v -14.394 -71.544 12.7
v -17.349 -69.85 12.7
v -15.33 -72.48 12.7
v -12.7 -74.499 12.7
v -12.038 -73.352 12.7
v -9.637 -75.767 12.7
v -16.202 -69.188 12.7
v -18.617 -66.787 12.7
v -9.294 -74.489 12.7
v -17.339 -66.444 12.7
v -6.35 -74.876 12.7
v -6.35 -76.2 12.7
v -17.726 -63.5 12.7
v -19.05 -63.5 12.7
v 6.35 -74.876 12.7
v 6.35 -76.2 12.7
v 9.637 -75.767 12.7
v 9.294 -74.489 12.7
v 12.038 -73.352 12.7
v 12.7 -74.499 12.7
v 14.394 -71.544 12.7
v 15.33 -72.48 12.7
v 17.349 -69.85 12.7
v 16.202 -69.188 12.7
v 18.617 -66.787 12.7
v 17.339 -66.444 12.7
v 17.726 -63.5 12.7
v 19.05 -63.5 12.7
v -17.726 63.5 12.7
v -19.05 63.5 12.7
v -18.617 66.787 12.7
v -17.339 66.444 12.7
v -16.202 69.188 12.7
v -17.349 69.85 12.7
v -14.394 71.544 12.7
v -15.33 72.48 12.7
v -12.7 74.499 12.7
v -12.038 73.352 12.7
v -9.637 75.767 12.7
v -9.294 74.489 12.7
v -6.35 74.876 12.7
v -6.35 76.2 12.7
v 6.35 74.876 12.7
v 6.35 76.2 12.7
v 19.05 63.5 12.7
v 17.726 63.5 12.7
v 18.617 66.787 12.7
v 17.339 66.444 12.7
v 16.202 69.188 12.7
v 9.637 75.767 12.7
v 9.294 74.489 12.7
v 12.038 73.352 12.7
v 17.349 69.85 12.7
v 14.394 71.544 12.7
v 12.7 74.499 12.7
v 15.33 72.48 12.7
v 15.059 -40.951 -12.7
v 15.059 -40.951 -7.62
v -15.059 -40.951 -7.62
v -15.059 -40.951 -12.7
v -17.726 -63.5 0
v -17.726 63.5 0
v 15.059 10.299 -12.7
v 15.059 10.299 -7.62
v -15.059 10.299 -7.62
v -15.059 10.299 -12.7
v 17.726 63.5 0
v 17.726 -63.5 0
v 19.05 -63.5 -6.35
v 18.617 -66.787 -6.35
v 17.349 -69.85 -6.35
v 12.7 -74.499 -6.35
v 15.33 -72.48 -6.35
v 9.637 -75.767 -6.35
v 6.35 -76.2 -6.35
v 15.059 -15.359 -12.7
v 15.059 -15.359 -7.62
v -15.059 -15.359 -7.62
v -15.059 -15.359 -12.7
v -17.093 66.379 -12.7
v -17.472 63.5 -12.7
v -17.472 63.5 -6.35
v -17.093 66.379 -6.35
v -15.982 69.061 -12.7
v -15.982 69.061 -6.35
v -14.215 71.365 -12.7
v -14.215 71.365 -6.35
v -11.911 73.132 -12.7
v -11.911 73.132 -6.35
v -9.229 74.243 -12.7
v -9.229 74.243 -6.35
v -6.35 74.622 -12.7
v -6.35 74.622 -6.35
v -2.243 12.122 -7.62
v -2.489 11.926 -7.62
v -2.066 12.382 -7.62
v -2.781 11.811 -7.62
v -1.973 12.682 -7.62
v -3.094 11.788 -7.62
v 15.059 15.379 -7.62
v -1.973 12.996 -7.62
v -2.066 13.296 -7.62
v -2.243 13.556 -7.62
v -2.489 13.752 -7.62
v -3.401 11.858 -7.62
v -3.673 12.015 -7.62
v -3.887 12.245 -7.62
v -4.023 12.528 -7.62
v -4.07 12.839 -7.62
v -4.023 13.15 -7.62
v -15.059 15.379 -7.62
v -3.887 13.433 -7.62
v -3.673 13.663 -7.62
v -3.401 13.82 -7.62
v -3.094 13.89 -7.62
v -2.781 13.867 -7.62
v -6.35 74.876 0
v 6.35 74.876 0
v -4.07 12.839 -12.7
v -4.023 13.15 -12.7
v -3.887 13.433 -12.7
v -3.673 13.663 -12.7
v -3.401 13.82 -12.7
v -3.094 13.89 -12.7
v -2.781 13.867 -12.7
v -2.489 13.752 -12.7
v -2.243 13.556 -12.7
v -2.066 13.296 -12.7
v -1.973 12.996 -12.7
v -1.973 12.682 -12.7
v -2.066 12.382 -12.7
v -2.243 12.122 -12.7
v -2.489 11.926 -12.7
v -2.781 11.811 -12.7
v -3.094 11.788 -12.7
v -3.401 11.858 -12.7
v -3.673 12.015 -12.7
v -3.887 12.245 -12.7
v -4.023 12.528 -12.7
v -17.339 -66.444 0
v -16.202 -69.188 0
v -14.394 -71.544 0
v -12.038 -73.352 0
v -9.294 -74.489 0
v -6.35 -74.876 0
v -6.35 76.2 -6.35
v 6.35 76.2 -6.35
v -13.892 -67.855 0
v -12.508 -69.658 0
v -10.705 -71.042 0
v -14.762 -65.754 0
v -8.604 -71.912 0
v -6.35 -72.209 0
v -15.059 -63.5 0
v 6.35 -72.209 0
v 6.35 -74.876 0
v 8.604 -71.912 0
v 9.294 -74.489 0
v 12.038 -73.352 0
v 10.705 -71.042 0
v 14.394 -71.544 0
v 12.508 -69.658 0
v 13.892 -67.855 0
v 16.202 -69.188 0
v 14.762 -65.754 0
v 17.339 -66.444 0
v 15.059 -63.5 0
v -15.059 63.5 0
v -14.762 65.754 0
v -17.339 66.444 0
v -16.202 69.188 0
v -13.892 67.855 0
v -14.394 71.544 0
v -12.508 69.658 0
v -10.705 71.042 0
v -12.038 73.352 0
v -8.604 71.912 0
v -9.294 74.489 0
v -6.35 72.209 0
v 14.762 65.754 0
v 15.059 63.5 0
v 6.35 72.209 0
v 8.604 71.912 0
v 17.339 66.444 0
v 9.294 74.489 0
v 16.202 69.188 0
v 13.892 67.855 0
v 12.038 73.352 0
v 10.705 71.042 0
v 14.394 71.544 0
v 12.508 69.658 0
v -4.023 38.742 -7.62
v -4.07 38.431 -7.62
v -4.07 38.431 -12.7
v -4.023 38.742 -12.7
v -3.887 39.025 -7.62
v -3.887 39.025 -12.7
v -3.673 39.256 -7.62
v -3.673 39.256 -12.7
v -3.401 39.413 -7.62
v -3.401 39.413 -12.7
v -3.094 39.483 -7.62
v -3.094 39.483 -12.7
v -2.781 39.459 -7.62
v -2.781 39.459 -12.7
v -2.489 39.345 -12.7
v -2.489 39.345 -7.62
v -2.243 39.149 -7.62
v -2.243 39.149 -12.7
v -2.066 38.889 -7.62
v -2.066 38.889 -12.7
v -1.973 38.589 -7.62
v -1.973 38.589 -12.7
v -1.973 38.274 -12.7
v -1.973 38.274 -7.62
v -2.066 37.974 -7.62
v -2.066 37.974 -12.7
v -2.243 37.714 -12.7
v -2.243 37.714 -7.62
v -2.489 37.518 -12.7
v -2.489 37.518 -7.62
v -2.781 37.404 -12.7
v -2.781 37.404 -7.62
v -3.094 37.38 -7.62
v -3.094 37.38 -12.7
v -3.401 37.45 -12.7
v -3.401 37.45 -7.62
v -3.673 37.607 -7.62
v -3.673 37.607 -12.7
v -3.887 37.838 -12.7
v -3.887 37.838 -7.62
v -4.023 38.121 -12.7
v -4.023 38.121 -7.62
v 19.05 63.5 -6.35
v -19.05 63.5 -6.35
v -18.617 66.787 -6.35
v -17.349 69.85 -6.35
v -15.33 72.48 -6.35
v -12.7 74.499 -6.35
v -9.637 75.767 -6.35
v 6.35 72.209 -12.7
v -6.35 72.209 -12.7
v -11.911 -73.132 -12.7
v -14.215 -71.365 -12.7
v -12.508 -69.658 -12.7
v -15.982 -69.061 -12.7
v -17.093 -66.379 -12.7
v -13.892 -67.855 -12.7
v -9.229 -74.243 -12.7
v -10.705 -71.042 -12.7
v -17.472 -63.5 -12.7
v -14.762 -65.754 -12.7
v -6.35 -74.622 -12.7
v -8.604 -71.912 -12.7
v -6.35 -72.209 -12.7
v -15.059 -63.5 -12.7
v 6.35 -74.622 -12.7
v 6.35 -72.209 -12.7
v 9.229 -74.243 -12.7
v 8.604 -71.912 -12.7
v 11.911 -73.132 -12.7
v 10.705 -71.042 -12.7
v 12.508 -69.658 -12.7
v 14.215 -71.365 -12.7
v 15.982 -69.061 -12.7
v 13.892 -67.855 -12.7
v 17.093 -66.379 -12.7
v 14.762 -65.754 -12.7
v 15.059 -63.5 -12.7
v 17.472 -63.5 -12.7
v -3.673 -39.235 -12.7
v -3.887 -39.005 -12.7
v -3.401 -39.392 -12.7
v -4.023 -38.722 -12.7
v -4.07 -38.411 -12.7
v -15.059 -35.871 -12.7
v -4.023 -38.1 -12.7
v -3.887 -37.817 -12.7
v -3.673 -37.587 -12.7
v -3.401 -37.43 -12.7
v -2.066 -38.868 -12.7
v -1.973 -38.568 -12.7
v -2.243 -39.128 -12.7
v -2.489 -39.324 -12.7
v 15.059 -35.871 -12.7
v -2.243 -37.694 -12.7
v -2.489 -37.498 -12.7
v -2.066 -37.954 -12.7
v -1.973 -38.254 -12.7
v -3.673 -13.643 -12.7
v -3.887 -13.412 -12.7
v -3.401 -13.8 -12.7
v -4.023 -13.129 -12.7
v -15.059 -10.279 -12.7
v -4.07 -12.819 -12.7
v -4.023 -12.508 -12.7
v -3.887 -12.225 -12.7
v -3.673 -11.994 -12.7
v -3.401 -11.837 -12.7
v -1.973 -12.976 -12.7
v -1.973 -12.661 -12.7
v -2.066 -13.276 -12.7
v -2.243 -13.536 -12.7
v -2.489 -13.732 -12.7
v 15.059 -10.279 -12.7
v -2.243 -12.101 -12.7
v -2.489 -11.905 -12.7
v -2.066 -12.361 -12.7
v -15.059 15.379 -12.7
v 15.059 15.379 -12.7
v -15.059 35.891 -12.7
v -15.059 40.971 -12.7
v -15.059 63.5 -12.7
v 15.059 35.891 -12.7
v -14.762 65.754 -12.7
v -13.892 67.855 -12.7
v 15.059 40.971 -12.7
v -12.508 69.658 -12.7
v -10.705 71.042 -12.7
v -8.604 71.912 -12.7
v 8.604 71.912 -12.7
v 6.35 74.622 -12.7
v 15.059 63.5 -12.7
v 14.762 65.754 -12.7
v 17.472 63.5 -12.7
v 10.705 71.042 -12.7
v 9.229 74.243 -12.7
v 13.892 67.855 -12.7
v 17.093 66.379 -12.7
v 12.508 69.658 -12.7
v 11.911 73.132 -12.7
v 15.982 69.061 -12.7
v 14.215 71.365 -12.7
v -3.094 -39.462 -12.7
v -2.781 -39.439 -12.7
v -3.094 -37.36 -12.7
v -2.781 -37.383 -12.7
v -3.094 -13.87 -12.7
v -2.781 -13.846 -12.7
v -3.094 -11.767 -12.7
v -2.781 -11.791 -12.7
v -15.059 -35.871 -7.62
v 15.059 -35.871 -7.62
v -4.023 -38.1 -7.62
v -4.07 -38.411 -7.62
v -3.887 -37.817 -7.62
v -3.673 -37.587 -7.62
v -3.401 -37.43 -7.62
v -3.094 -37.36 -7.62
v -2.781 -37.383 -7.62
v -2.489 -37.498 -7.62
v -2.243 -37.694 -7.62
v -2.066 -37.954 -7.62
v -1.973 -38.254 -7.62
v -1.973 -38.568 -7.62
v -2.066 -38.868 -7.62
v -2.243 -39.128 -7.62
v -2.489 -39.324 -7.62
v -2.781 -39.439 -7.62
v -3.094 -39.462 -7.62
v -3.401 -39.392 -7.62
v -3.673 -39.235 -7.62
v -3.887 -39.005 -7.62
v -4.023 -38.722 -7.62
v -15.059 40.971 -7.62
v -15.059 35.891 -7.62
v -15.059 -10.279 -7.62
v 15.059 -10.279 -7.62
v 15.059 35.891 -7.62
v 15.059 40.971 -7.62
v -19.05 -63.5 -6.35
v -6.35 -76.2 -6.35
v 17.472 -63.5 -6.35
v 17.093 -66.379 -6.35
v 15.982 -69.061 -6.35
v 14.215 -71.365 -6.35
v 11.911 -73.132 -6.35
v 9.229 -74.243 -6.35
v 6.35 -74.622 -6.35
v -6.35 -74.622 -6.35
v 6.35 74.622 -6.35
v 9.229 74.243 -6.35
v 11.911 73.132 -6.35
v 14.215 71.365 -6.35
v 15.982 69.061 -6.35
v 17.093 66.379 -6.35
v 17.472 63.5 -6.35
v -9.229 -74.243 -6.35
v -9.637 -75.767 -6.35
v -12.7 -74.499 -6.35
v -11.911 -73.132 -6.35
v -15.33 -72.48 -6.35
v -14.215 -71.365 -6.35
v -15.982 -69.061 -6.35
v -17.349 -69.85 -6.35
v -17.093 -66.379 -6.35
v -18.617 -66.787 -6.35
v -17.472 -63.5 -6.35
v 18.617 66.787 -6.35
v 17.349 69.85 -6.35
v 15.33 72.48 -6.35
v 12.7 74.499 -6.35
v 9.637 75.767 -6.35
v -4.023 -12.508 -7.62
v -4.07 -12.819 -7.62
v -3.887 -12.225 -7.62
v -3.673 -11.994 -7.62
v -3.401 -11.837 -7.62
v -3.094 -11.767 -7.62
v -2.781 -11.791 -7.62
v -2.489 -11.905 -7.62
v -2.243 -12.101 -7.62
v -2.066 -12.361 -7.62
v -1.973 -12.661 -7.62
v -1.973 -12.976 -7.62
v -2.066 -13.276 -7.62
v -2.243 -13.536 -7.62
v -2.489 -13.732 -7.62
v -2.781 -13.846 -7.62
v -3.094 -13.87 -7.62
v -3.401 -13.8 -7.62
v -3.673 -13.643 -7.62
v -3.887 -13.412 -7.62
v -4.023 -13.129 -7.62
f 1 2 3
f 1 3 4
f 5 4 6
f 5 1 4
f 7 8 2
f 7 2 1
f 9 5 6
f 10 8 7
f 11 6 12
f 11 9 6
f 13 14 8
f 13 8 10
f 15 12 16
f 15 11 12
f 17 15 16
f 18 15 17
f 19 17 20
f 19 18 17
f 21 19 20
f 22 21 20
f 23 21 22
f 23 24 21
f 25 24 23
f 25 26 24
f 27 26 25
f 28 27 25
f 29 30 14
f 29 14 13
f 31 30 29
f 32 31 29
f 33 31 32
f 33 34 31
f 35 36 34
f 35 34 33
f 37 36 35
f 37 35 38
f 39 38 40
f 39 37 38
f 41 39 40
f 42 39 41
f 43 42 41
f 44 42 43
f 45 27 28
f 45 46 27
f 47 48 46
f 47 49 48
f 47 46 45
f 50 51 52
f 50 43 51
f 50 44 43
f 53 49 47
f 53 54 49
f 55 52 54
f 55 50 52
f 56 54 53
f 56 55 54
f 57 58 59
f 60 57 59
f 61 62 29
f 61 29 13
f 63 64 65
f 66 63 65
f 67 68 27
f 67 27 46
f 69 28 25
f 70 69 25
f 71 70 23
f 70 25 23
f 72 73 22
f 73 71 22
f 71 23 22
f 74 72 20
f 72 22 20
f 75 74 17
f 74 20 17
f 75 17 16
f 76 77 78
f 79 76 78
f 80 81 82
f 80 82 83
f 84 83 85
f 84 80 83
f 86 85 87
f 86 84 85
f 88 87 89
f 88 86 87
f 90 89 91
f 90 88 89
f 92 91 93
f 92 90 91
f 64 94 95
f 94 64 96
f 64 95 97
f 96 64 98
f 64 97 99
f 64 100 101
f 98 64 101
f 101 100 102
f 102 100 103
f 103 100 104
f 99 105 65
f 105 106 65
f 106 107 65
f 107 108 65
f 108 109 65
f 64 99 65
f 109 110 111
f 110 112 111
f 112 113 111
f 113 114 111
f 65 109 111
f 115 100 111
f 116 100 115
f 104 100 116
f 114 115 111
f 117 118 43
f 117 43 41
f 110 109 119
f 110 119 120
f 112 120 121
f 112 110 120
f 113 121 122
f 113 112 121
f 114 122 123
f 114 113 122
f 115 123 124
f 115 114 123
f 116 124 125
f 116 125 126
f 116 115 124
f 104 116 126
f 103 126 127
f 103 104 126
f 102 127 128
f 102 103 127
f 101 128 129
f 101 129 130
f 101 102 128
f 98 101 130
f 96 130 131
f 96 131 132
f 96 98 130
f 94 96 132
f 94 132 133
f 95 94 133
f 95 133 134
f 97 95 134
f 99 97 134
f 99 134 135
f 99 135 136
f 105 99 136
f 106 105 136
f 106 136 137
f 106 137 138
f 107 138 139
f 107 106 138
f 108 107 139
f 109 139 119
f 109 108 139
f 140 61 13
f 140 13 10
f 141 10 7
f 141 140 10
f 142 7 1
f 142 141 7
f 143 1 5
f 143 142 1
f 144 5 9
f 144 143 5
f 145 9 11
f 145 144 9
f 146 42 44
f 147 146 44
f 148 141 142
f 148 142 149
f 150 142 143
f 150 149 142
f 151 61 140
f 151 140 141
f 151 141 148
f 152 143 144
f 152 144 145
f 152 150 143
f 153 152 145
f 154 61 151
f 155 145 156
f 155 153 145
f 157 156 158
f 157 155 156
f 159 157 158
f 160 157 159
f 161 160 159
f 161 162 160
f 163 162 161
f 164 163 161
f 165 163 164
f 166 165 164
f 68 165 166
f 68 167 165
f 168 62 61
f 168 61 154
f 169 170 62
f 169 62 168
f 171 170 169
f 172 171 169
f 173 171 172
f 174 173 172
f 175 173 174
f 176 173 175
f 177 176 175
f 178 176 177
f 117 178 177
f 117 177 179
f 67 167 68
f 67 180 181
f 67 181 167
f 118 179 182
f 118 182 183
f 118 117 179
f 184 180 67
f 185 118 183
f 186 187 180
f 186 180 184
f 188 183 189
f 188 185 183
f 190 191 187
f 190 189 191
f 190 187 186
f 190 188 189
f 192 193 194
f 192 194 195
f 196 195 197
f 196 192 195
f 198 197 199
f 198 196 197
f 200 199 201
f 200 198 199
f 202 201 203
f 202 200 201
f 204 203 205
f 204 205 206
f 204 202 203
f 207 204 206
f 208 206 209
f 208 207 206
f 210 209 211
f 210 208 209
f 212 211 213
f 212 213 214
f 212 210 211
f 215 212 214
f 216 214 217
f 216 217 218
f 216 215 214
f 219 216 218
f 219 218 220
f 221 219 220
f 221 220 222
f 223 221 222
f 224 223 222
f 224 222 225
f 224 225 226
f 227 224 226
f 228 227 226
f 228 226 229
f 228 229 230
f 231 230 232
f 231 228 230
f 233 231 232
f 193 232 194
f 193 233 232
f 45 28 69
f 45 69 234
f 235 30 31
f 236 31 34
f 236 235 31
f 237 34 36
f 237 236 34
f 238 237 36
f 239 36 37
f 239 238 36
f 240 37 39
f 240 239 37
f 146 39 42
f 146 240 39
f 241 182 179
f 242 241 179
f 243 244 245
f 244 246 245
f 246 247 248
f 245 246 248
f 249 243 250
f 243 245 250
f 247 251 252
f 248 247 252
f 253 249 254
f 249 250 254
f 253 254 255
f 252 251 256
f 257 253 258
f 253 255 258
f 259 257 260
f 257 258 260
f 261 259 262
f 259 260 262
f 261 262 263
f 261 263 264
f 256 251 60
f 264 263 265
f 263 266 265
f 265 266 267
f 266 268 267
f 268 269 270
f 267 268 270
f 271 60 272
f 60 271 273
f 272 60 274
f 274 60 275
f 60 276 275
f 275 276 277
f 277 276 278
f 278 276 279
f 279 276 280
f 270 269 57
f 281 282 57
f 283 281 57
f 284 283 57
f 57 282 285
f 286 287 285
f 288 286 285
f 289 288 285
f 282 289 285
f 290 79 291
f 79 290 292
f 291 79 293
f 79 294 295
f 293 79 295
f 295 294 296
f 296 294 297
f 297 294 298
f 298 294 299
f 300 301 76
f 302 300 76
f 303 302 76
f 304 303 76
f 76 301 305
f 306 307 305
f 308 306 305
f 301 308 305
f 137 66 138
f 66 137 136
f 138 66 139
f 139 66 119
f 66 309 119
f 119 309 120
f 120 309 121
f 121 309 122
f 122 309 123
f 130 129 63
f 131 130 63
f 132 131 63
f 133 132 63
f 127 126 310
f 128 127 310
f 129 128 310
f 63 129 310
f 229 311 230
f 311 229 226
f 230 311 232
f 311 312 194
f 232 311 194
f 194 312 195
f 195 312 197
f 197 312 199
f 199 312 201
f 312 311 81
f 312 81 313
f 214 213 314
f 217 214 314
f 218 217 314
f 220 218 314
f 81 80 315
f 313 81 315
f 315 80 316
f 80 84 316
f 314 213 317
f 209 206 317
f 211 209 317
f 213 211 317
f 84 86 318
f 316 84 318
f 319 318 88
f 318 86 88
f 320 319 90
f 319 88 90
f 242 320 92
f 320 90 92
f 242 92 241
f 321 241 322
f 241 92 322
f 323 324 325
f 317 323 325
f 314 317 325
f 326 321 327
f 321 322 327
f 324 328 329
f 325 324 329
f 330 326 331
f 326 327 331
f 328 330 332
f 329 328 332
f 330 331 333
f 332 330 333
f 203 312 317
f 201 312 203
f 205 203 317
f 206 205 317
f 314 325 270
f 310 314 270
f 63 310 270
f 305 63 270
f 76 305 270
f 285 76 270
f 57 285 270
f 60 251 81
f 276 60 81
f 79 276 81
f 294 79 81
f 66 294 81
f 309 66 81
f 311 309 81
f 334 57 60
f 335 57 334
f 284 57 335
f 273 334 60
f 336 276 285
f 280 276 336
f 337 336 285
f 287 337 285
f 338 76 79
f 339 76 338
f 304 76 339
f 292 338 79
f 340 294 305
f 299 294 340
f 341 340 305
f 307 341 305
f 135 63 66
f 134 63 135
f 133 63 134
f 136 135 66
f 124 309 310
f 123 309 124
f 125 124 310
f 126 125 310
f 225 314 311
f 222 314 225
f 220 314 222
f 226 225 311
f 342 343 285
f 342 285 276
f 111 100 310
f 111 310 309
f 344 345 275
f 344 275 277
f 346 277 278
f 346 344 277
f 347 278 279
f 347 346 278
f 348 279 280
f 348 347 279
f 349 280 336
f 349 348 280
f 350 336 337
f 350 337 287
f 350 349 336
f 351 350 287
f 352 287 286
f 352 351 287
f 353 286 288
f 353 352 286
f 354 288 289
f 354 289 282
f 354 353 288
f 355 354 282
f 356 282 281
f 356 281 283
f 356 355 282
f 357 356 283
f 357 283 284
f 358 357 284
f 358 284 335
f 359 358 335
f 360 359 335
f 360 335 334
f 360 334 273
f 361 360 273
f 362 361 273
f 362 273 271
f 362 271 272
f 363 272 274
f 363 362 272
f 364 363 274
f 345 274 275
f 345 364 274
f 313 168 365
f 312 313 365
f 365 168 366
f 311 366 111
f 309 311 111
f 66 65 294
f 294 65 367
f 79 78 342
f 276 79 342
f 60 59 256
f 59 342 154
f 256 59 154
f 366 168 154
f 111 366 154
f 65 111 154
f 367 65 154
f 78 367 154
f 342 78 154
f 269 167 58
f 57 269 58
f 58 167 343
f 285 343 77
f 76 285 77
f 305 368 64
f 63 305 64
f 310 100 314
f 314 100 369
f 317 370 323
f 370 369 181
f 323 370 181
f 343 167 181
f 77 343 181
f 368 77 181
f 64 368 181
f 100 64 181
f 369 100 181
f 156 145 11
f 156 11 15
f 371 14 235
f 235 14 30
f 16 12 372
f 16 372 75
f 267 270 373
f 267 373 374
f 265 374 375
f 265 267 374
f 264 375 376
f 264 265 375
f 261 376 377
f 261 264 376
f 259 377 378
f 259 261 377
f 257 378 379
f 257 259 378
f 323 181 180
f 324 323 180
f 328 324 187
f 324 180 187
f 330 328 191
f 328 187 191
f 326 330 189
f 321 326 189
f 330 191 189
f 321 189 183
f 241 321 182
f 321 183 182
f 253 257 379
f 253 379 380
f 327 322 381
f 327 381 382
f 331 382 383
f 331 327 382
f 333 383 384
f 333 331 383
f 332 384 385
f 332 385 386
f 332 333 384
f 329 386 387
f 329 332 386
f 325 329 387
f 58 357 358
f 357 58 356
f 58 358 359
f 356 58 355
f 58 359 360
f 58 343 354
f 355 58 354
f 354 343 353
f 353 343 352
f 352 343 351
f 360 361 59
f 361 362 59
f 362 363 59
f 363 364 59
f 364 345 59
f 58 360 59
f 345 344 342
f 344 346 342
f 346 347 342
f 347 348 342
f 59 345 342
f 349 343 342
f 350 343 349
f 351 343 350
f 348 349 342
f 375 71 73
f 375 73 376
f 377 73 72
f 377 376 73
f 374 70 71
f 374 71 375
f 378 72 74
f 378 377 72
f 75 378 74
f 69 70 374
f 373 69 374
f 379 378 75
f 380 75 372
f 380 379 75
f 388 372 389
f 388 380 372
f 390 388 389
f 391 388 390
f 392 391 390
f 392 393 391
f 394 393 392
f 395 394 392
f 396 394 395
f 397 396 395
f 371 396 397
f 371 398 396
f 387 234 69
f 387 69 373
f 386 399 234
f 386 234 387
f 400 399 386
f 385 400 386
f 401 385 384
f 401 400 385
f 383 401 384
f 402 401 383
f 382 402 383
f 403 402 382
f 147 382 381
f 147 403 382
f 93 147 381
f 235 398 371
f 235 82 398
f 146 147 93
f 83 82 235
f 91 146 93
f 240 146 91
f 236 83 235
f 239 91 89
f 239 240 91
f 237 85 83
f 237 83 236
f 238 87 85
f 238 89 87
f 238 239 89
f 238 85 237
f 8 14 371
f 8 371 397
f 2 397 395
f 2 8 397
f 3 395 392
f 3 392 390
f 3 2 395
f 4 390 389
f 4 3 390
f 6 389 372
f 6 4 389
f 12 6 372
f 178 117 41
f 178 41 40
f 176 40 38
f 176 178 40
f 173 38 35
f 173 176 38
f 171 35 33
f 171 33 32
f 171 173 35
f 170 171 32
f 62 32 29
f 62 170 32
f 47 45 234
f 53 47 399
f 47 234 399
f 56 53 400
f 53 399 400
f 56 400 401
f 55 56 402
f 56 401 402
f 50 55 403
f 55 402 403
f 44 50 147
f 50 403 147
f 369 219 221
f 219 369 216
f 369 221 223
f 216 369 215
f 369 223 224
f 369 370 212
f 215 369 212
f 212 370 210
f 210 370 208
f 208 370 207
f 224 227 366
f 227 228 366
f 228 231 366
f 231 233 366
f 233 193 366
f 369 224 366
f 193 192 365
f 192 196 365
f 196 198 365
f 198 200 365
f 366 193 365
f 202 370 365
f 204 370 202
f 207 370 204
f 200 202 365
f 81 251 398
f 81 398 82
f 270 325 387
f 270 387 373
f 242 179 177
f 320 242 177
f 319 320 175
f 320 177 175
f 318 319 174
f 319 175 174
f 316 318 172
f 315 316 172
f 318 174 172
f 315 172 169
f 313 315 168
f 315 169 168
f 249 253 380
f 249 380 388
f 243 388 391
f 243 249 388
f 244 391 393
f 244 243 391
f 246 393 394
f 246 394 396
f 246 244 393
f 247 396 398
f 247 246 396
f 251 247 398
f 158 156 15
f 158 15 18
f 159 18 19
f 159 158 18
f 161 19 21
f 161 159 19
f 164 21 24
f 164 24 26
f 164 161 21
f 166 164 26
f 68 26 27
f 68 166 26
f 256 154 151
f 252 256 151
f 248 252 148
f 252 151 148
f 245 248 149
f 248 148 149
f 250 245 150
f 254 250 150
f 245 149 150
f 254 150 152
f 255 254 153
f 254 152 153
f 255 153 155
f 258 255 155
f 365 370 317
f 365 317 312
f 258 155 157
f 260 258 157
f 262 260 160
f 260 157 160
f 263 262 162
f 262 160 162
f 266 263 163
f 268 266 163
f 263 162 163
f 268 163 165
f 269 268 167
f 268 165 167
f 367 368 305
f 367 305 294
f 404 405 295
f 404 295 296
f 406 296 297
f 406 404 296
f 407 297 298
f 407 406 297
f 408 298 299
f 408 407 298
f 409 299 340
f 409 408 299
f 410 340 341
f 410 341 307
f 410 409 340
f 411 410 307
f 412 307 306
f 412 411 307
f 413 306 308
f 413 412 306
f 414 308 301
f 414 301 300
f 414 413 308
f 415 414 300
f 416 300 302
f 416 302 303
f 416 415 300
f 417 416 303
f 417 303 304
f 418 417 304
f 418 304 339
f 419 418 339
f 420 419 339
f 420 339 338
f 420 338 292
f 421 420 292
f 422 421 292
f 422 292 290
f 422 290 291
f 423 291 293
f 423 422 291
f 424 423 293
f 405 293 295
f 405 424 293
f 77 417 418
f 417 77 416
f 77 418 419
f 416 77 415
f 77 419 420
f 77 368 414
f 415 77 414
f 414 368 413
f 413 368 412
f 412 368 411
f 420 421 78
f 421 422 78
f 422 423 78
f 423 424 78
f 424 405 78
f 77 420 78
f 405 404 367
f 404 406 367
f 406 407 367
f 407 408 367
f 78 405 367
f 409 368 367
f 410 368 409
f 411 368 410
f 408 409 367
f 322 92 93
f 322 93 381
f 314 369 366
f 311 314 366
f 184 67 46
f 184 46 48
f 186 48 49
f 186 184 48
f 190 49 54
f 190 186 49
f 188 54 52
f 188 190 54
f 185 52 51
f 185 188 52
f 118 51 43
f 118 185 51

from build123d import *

# Parameters (mm, degrees)
SKETCH1_W               = 38.1
SKETCH1_H               = 152.4
BOSS_EXTRUDE1_DEPTH     = 12.7
FILLET1_R               = 12.7
CUT_EXTRUDE1_DEPTH      = 83.55
EXTRUDE_THIN1_START     = -12.7
EXTRUDE_THIN1_DEPTH     = 12.7
CUT_EXTRUDE2_DEPTH      = 6.35
SKETCH6_W               = 35.1984056
SKETCH6_H               = 5.08
SKETCH6_R               = 1.054294776
BOSS_EXTRUDE2_DEPTH     = 5.08
CLEARANCE_1_DEPTH       = 6.35
CUT_EXTRUDE_THIN2_START = -12.7
CUT_EXTRUDE_THIN2_DEPTH = 12.7


with BuildPart() as part:
    # Sketch1 → Boss-Extrude1 (new, symmetric)
    with BuildSketch(Plane.XY):
        Rectangle(SKETCH1_W, SKETCH1_H)
    extrude(amount=BOSS_EXTRUDE1_DEPTH, both=True)

    # Fillet1
    fillet1_edges = [part.edges().sort_by_distance(p)[0] for p in [
        (19.05, -76.2, 0),
        (-19.05, -76.2, 0),
        (-19.05, 76.2, 0),
        (19.05, 76.2, 0),
    ]]
    fillet(fillet1_edges, radius=FILLET1_R)

    # Sketch2 → Cut-Extrude1 (cut, through all)
    with BuildSketch(Plane.XY.offset(12.7)):
        with BuildLine():
            Line((-17.599200768, 63.5), (-17.599200768, -63.5))
            ThreePointArc((-17.599200768, -63.5), (-14.304386146, -71.454386146), (-6.35, -74.749200768))
            Line((-6.35, -74.749200768), (6.35, -74.749200768))
            ThreePointArc((6.35, -74.749200768), (14.304386146, -71.454386146), (17.599200768, -63.5))
            Line((17.599200768, -63.5), (17.599200768, 63.5))
            ThreePointArc((17.599200768, 63.5), (14.304386146, 71.454386146), (6.35, 74.749200768))
            Line((6.35, 74.749200768), (-6.35, 74.749200768))
            ThreePointArc((-6.35, 74.749200768), (-14.304386146, 71.454386146), (-17.599200768, 63.5))
        make_face()
    extrude(amount=-CUT_EXTRUDE1_DEPTH, mode=Mode.SUBTRACT)

    # Sketch3 → Extrude-Thin1 (add)
    with BuildSketch(Plane(origin=(0, 0, -12.7), x_dir=(-1, 0, 0), z_dir=(0, 0, -1)).offset(EXTRUDE_THIN1_START)):
        with BuildLine():
            Line((-6.35, 74.749200768), (6.35, 74.749200768))
            ThreePointArc((6.35, 74.749200768), (14.304386146, 71.454386146), (17.599200768, 63.5))
            Line((17.599200768, 63.5), (17.599200768, -63.5))
            ThreePointArc((17.599200768, -63.5), (14.304386146, -71.454386146), (6.35, -74.749200768))
            Line((6.35, -74.749200768), (-6.35, -74.749200768))
            ThreePointArc((-6.35, -74.749200768), (-14.304386146, -71.454386146), (-17.599200768, -63.5))
            Line((-17.599200768, -63.5), (-17.599200768, 63.5))
            ThreePointArc((-17.599200768, 63.5), (-14.304386146, 71.454386146), (-6.35, 74.749200768))
        make_face()
        with BuildLine():
            Line((-6.35, 72.209200768), (6.35, 72.209200768))
            ThreePointArc((6.35, 72.209200768), (12.508334922, 69.658334922), (15.059200768, 63.5))
            Line((15.059200768, 63.5), (15.059200768, -63.5))
            ThreePointArc((15.059200768, -63.5), (12.508334922, -69.658334922), (6.35, -72.209200768))
            Line((6.35, -72.209200768), (-6.35, -72.209200768))
            ThreePointArc((-6.35, -72.209200768), (-12.508334922, -69.658334922), (-15.059200768, -63.5))
            Line((-15.059200768, -63.5), (-15.059200768, 63.5))
            ThreePointArc((-15.059200768, 63.5), (-12.508334922, 69.658334922), (-6.35, 72.209200768))
        make_face(mode=Mode.SUBTRACT)
    extrude(amount=EXTRUDE_THIN1_DEPTH)

    # Sketch4 → Cut-Extrude2 (cut)
    with BuildSketch(Plane(origin=(0, 0, -12.7), x_dir=(-1, 0, 0), z_dir=(0, 0, -1))):
        with BuildLine():
            Line((6.35, -76.2), (-6.35, -76.2))
            ThreePointArc((-6.35, -76.2), (-15.330256121, -72.480256121), (-19.05, -63.5))
            Line((-19.05, -63.5), (-19.05, 63.5))
            ThreePointArc((-19.05, 63.5), (-15.330256121, 72.480256121), (-6.35, 76.2))
            Line((-6.35, 76.2), (6.35, 76.2))
            ThreePointArc((6.35, 76.2), (15.330256121, 72.480256121), (19.05, 63.5))
            Line((19.05, 63.5), (19.05, -63.5))
            ThreePointArc((19.05, -63.5), (15.330256121, -72.480256121), (6.35, -76.2))
        make_face()
        with BuildLine():
            Line((-17.5992028, -63.5), (-17.5992028, 63.5))
            ThreePointArc((-17.5992028, 63.5), (-14.304387583, 71.454387583), (-6.35, 74.7492028))
            Line((-6.35, 74.7492028), (6.35, 74.7492028))
            ThreePointArc((6.35, 74.7492028), (14.304387583, 71.454387583), (17.5992028, 63.5))
            Line((17.5992028, 63.5), (17.5992028, -63.5))
            ThreePointArc((17.5992028, -63.5), (14.304387583, -71.454387583), (6.35, -74.7492028))
            Line((6.35, -74.7492028), (-6.35, -74.7492028))
            ThreePointArc((-6.35, -74.7492028), (-14.304387583, -71.454387583), (-17.5992028, -63.5))
        make_face(mode=Mode.SUBTRACT)
    extrude(amount=-CUT_EXTRUDE2_DEPTH, mode=Mode.SUBTRACT)

    # Sketch6 → Boss-Extrude2 (add)
    # profile 1 of 4: a face of its own
    with BuildSketch(Plane(origin=(0, 0, -7.62), x_dir=(-1, 0, 0), z_dir=(0, 0, -1))):
        with Locations((0, 38.431496192)):
            Rectangle(SKETCH6_W, SKETCH6_H)
        with Locations((3.015690418, 38.431496192)):
            Circle(SKETCH6_R, mode=Mode.SUBTRACT)
    # profile 2 of 4: a face of its own
    with BuildSketch(Plane(origin=(0, 0, -7.62), x_dir=(-1, 0, 0), z_dir=(0, 0, -1))):
        with Locations((0, 12.839006486)):
            Rectangle(SKETCH6_W, SKETCH6_H)
        with Locations((3.015690418, 12.839006486)):
            Circle(SKETCH6_R, mode=Mode.SUBTRACT)
    # profile 3 of 4: a face of its own
    with BuildSketch(Plane(origin=(0, 0, -7.62), x_dir=(-1, 0, 0), z_dir=(0, 0, -1))):
        with Locations((0, -12.818503808)):
            Rectangle(SKETCH6_W, SKETCH6_H)
        with Locations((3.015690418, -12.818503808)):
            Circle(SKETCH6_R, mode=Mode.SUBTRACT)
    # profile 4 of 4: a face of its own
    with BuildSketch(Plane(origin=(0, 0, -7.62), x_dir=(-1, 0, 0), z_dir=(0, 0, -1))):
        with Locations((0, -38.410993514)):
            Rectangle(SKETCH6_W, SKETCH6_H)
        with Locations((3.015690418, -38.410993514)):
            Circle(SKETCH6_R, mode=Mode.SUBTRACT)
    extrude(amount=BOSS_EXTRUDE2_DEPTH)

    # Sketch7 → Clearance 1 (cut)
    with BuildSketch(Plane(origin=(0, 0, -12.7), x_dir=(-1, 0, 0), z_dir=(0, 0, -1))):
        with BuildLine():
            Line((-17.5992028, 63.5), (-17.5992028, -63.5))
            ThreePointArc((-17.5992028, -63.5), (-14.304387583, -71.454387583), (-6.35, -74.7492028))
            Line((-6.35, -74.7492028), (6.35, -74.7492028))
            ThreePointArc((6.35, -74.7492028), (14.304387583, -71.454387583), (17.5992028, -63.5))
            Line((17.5992028, -63.5), (17.5992028, 63.5))
            ThreePointArc((17.5992028, 63.5), (14.304387583, 71.454387583), (6.35, 74.7492028))
            Line((6.35, 74.7492028), (-6.35, 74.7492028))
            ThreePointArc((-6.35, 74.7492028), (-14.304387583, 71.454387583), (-17.5992028, 63.5))
        make_face()
        with BuildLine():
            Line((-17.4722028, 63.5), (-17.4722028, -63.5))
            ThreePointArc((-17.4722028, -63.5), (-14.214585022, -71.364585022), (-6.35, -74.6222028))
            Line((-6.35, -74.6222028), (6.35, -74.6222028))
            ThreePointArc((6.35, -74.6222028), (14.214585022, -71.364585022), (17.4722028, -63.5))
            Line((17.4722028, -63.5), (17.4722028, 63.5))
            ThreePointArc((17.4722028, 63.5), (14.214585022, 71.364585022), (6.35, 74.6222028))
            Line((6.35, 74.6222028), (-6.35, 74.6222028))
            ThreePointArc((-6.35, 74.6222028), (-14.214585022, 71.364585022), (-17.4722028, 63.5))
        make_face(mode=Mode.SUBTRACT)
    extrude(amount=-CLEARANCE_1_DEPTH, mode=Mode.SUBTRACT)

    # Sketch8 → Cut-Extrude-Thin2 (cut)
    with BuildSketch(Plane.XY.offset(12.7).offset(CUT_EXTRUDE_THIN2_START)):
        with BuildLine():
            Line((-17.726200768, 63.5), (-17.726200768, -63.5))
            ThreePointArc((-17.726200768, -63.5), (-14.394188707, -71.544188707), (-6.35, -74.876200768))
            Line((-6.35, -74.876200768), (6.35, -74.876200768))
            ThreePointArc((6.35, -74.876200768), (14.394188707, -71.544188707), (17.726200768, -63.5))
            Line((17.726200768, -63.5), (17.726200768, 63.5))
            ThreePointArc((17.726200768, 63.5), (14.394188707, 71.544188707), (6.35, 74.876200768))
            Line((6.35, 74.876200768), (-6.35, 74.876200768))
            ThreePointArc((-6.35, 74.876200768), (-14.394188707, 71.544188707), (-17.726200768, 63.5))
        make_face()
        with BuildLine():
            Line((-17.599200768, 63.5), (-17.599200768, -63.5))
            ThreePointArc((-17.599200768, -63.5), (-14.304386146, -71.454386146), (-6.35, -74.749200768))
            Line((-6.35, -74.749200768), (6.35, -74.749200768))
            ThreePointArc((6.35, -74.749200768), (14.304386146, -71.454386146), (17.599200768, -63.5))
            Line((17.599200768, -63.5), (17.599200768, 63.5))
            ThreePointArc((17.599200768, 63.5), (14.304386146, 71.454386146), (6.35, 74.749200768))
            Line((6.35, 74.749200768), (-6.35, 74.749200768))
            ThreePointArc((-6.35, 74.749200768), (-14.304386146, 71.454386146), (-17.599200768, 63.5))
        make_face(mode=Mode.SUBTRACT)
    extrude(amount=CUT_EXTRUDE_THIN2_DEPTH, mode=Mode.SUBTRACT)


solid = part.part
